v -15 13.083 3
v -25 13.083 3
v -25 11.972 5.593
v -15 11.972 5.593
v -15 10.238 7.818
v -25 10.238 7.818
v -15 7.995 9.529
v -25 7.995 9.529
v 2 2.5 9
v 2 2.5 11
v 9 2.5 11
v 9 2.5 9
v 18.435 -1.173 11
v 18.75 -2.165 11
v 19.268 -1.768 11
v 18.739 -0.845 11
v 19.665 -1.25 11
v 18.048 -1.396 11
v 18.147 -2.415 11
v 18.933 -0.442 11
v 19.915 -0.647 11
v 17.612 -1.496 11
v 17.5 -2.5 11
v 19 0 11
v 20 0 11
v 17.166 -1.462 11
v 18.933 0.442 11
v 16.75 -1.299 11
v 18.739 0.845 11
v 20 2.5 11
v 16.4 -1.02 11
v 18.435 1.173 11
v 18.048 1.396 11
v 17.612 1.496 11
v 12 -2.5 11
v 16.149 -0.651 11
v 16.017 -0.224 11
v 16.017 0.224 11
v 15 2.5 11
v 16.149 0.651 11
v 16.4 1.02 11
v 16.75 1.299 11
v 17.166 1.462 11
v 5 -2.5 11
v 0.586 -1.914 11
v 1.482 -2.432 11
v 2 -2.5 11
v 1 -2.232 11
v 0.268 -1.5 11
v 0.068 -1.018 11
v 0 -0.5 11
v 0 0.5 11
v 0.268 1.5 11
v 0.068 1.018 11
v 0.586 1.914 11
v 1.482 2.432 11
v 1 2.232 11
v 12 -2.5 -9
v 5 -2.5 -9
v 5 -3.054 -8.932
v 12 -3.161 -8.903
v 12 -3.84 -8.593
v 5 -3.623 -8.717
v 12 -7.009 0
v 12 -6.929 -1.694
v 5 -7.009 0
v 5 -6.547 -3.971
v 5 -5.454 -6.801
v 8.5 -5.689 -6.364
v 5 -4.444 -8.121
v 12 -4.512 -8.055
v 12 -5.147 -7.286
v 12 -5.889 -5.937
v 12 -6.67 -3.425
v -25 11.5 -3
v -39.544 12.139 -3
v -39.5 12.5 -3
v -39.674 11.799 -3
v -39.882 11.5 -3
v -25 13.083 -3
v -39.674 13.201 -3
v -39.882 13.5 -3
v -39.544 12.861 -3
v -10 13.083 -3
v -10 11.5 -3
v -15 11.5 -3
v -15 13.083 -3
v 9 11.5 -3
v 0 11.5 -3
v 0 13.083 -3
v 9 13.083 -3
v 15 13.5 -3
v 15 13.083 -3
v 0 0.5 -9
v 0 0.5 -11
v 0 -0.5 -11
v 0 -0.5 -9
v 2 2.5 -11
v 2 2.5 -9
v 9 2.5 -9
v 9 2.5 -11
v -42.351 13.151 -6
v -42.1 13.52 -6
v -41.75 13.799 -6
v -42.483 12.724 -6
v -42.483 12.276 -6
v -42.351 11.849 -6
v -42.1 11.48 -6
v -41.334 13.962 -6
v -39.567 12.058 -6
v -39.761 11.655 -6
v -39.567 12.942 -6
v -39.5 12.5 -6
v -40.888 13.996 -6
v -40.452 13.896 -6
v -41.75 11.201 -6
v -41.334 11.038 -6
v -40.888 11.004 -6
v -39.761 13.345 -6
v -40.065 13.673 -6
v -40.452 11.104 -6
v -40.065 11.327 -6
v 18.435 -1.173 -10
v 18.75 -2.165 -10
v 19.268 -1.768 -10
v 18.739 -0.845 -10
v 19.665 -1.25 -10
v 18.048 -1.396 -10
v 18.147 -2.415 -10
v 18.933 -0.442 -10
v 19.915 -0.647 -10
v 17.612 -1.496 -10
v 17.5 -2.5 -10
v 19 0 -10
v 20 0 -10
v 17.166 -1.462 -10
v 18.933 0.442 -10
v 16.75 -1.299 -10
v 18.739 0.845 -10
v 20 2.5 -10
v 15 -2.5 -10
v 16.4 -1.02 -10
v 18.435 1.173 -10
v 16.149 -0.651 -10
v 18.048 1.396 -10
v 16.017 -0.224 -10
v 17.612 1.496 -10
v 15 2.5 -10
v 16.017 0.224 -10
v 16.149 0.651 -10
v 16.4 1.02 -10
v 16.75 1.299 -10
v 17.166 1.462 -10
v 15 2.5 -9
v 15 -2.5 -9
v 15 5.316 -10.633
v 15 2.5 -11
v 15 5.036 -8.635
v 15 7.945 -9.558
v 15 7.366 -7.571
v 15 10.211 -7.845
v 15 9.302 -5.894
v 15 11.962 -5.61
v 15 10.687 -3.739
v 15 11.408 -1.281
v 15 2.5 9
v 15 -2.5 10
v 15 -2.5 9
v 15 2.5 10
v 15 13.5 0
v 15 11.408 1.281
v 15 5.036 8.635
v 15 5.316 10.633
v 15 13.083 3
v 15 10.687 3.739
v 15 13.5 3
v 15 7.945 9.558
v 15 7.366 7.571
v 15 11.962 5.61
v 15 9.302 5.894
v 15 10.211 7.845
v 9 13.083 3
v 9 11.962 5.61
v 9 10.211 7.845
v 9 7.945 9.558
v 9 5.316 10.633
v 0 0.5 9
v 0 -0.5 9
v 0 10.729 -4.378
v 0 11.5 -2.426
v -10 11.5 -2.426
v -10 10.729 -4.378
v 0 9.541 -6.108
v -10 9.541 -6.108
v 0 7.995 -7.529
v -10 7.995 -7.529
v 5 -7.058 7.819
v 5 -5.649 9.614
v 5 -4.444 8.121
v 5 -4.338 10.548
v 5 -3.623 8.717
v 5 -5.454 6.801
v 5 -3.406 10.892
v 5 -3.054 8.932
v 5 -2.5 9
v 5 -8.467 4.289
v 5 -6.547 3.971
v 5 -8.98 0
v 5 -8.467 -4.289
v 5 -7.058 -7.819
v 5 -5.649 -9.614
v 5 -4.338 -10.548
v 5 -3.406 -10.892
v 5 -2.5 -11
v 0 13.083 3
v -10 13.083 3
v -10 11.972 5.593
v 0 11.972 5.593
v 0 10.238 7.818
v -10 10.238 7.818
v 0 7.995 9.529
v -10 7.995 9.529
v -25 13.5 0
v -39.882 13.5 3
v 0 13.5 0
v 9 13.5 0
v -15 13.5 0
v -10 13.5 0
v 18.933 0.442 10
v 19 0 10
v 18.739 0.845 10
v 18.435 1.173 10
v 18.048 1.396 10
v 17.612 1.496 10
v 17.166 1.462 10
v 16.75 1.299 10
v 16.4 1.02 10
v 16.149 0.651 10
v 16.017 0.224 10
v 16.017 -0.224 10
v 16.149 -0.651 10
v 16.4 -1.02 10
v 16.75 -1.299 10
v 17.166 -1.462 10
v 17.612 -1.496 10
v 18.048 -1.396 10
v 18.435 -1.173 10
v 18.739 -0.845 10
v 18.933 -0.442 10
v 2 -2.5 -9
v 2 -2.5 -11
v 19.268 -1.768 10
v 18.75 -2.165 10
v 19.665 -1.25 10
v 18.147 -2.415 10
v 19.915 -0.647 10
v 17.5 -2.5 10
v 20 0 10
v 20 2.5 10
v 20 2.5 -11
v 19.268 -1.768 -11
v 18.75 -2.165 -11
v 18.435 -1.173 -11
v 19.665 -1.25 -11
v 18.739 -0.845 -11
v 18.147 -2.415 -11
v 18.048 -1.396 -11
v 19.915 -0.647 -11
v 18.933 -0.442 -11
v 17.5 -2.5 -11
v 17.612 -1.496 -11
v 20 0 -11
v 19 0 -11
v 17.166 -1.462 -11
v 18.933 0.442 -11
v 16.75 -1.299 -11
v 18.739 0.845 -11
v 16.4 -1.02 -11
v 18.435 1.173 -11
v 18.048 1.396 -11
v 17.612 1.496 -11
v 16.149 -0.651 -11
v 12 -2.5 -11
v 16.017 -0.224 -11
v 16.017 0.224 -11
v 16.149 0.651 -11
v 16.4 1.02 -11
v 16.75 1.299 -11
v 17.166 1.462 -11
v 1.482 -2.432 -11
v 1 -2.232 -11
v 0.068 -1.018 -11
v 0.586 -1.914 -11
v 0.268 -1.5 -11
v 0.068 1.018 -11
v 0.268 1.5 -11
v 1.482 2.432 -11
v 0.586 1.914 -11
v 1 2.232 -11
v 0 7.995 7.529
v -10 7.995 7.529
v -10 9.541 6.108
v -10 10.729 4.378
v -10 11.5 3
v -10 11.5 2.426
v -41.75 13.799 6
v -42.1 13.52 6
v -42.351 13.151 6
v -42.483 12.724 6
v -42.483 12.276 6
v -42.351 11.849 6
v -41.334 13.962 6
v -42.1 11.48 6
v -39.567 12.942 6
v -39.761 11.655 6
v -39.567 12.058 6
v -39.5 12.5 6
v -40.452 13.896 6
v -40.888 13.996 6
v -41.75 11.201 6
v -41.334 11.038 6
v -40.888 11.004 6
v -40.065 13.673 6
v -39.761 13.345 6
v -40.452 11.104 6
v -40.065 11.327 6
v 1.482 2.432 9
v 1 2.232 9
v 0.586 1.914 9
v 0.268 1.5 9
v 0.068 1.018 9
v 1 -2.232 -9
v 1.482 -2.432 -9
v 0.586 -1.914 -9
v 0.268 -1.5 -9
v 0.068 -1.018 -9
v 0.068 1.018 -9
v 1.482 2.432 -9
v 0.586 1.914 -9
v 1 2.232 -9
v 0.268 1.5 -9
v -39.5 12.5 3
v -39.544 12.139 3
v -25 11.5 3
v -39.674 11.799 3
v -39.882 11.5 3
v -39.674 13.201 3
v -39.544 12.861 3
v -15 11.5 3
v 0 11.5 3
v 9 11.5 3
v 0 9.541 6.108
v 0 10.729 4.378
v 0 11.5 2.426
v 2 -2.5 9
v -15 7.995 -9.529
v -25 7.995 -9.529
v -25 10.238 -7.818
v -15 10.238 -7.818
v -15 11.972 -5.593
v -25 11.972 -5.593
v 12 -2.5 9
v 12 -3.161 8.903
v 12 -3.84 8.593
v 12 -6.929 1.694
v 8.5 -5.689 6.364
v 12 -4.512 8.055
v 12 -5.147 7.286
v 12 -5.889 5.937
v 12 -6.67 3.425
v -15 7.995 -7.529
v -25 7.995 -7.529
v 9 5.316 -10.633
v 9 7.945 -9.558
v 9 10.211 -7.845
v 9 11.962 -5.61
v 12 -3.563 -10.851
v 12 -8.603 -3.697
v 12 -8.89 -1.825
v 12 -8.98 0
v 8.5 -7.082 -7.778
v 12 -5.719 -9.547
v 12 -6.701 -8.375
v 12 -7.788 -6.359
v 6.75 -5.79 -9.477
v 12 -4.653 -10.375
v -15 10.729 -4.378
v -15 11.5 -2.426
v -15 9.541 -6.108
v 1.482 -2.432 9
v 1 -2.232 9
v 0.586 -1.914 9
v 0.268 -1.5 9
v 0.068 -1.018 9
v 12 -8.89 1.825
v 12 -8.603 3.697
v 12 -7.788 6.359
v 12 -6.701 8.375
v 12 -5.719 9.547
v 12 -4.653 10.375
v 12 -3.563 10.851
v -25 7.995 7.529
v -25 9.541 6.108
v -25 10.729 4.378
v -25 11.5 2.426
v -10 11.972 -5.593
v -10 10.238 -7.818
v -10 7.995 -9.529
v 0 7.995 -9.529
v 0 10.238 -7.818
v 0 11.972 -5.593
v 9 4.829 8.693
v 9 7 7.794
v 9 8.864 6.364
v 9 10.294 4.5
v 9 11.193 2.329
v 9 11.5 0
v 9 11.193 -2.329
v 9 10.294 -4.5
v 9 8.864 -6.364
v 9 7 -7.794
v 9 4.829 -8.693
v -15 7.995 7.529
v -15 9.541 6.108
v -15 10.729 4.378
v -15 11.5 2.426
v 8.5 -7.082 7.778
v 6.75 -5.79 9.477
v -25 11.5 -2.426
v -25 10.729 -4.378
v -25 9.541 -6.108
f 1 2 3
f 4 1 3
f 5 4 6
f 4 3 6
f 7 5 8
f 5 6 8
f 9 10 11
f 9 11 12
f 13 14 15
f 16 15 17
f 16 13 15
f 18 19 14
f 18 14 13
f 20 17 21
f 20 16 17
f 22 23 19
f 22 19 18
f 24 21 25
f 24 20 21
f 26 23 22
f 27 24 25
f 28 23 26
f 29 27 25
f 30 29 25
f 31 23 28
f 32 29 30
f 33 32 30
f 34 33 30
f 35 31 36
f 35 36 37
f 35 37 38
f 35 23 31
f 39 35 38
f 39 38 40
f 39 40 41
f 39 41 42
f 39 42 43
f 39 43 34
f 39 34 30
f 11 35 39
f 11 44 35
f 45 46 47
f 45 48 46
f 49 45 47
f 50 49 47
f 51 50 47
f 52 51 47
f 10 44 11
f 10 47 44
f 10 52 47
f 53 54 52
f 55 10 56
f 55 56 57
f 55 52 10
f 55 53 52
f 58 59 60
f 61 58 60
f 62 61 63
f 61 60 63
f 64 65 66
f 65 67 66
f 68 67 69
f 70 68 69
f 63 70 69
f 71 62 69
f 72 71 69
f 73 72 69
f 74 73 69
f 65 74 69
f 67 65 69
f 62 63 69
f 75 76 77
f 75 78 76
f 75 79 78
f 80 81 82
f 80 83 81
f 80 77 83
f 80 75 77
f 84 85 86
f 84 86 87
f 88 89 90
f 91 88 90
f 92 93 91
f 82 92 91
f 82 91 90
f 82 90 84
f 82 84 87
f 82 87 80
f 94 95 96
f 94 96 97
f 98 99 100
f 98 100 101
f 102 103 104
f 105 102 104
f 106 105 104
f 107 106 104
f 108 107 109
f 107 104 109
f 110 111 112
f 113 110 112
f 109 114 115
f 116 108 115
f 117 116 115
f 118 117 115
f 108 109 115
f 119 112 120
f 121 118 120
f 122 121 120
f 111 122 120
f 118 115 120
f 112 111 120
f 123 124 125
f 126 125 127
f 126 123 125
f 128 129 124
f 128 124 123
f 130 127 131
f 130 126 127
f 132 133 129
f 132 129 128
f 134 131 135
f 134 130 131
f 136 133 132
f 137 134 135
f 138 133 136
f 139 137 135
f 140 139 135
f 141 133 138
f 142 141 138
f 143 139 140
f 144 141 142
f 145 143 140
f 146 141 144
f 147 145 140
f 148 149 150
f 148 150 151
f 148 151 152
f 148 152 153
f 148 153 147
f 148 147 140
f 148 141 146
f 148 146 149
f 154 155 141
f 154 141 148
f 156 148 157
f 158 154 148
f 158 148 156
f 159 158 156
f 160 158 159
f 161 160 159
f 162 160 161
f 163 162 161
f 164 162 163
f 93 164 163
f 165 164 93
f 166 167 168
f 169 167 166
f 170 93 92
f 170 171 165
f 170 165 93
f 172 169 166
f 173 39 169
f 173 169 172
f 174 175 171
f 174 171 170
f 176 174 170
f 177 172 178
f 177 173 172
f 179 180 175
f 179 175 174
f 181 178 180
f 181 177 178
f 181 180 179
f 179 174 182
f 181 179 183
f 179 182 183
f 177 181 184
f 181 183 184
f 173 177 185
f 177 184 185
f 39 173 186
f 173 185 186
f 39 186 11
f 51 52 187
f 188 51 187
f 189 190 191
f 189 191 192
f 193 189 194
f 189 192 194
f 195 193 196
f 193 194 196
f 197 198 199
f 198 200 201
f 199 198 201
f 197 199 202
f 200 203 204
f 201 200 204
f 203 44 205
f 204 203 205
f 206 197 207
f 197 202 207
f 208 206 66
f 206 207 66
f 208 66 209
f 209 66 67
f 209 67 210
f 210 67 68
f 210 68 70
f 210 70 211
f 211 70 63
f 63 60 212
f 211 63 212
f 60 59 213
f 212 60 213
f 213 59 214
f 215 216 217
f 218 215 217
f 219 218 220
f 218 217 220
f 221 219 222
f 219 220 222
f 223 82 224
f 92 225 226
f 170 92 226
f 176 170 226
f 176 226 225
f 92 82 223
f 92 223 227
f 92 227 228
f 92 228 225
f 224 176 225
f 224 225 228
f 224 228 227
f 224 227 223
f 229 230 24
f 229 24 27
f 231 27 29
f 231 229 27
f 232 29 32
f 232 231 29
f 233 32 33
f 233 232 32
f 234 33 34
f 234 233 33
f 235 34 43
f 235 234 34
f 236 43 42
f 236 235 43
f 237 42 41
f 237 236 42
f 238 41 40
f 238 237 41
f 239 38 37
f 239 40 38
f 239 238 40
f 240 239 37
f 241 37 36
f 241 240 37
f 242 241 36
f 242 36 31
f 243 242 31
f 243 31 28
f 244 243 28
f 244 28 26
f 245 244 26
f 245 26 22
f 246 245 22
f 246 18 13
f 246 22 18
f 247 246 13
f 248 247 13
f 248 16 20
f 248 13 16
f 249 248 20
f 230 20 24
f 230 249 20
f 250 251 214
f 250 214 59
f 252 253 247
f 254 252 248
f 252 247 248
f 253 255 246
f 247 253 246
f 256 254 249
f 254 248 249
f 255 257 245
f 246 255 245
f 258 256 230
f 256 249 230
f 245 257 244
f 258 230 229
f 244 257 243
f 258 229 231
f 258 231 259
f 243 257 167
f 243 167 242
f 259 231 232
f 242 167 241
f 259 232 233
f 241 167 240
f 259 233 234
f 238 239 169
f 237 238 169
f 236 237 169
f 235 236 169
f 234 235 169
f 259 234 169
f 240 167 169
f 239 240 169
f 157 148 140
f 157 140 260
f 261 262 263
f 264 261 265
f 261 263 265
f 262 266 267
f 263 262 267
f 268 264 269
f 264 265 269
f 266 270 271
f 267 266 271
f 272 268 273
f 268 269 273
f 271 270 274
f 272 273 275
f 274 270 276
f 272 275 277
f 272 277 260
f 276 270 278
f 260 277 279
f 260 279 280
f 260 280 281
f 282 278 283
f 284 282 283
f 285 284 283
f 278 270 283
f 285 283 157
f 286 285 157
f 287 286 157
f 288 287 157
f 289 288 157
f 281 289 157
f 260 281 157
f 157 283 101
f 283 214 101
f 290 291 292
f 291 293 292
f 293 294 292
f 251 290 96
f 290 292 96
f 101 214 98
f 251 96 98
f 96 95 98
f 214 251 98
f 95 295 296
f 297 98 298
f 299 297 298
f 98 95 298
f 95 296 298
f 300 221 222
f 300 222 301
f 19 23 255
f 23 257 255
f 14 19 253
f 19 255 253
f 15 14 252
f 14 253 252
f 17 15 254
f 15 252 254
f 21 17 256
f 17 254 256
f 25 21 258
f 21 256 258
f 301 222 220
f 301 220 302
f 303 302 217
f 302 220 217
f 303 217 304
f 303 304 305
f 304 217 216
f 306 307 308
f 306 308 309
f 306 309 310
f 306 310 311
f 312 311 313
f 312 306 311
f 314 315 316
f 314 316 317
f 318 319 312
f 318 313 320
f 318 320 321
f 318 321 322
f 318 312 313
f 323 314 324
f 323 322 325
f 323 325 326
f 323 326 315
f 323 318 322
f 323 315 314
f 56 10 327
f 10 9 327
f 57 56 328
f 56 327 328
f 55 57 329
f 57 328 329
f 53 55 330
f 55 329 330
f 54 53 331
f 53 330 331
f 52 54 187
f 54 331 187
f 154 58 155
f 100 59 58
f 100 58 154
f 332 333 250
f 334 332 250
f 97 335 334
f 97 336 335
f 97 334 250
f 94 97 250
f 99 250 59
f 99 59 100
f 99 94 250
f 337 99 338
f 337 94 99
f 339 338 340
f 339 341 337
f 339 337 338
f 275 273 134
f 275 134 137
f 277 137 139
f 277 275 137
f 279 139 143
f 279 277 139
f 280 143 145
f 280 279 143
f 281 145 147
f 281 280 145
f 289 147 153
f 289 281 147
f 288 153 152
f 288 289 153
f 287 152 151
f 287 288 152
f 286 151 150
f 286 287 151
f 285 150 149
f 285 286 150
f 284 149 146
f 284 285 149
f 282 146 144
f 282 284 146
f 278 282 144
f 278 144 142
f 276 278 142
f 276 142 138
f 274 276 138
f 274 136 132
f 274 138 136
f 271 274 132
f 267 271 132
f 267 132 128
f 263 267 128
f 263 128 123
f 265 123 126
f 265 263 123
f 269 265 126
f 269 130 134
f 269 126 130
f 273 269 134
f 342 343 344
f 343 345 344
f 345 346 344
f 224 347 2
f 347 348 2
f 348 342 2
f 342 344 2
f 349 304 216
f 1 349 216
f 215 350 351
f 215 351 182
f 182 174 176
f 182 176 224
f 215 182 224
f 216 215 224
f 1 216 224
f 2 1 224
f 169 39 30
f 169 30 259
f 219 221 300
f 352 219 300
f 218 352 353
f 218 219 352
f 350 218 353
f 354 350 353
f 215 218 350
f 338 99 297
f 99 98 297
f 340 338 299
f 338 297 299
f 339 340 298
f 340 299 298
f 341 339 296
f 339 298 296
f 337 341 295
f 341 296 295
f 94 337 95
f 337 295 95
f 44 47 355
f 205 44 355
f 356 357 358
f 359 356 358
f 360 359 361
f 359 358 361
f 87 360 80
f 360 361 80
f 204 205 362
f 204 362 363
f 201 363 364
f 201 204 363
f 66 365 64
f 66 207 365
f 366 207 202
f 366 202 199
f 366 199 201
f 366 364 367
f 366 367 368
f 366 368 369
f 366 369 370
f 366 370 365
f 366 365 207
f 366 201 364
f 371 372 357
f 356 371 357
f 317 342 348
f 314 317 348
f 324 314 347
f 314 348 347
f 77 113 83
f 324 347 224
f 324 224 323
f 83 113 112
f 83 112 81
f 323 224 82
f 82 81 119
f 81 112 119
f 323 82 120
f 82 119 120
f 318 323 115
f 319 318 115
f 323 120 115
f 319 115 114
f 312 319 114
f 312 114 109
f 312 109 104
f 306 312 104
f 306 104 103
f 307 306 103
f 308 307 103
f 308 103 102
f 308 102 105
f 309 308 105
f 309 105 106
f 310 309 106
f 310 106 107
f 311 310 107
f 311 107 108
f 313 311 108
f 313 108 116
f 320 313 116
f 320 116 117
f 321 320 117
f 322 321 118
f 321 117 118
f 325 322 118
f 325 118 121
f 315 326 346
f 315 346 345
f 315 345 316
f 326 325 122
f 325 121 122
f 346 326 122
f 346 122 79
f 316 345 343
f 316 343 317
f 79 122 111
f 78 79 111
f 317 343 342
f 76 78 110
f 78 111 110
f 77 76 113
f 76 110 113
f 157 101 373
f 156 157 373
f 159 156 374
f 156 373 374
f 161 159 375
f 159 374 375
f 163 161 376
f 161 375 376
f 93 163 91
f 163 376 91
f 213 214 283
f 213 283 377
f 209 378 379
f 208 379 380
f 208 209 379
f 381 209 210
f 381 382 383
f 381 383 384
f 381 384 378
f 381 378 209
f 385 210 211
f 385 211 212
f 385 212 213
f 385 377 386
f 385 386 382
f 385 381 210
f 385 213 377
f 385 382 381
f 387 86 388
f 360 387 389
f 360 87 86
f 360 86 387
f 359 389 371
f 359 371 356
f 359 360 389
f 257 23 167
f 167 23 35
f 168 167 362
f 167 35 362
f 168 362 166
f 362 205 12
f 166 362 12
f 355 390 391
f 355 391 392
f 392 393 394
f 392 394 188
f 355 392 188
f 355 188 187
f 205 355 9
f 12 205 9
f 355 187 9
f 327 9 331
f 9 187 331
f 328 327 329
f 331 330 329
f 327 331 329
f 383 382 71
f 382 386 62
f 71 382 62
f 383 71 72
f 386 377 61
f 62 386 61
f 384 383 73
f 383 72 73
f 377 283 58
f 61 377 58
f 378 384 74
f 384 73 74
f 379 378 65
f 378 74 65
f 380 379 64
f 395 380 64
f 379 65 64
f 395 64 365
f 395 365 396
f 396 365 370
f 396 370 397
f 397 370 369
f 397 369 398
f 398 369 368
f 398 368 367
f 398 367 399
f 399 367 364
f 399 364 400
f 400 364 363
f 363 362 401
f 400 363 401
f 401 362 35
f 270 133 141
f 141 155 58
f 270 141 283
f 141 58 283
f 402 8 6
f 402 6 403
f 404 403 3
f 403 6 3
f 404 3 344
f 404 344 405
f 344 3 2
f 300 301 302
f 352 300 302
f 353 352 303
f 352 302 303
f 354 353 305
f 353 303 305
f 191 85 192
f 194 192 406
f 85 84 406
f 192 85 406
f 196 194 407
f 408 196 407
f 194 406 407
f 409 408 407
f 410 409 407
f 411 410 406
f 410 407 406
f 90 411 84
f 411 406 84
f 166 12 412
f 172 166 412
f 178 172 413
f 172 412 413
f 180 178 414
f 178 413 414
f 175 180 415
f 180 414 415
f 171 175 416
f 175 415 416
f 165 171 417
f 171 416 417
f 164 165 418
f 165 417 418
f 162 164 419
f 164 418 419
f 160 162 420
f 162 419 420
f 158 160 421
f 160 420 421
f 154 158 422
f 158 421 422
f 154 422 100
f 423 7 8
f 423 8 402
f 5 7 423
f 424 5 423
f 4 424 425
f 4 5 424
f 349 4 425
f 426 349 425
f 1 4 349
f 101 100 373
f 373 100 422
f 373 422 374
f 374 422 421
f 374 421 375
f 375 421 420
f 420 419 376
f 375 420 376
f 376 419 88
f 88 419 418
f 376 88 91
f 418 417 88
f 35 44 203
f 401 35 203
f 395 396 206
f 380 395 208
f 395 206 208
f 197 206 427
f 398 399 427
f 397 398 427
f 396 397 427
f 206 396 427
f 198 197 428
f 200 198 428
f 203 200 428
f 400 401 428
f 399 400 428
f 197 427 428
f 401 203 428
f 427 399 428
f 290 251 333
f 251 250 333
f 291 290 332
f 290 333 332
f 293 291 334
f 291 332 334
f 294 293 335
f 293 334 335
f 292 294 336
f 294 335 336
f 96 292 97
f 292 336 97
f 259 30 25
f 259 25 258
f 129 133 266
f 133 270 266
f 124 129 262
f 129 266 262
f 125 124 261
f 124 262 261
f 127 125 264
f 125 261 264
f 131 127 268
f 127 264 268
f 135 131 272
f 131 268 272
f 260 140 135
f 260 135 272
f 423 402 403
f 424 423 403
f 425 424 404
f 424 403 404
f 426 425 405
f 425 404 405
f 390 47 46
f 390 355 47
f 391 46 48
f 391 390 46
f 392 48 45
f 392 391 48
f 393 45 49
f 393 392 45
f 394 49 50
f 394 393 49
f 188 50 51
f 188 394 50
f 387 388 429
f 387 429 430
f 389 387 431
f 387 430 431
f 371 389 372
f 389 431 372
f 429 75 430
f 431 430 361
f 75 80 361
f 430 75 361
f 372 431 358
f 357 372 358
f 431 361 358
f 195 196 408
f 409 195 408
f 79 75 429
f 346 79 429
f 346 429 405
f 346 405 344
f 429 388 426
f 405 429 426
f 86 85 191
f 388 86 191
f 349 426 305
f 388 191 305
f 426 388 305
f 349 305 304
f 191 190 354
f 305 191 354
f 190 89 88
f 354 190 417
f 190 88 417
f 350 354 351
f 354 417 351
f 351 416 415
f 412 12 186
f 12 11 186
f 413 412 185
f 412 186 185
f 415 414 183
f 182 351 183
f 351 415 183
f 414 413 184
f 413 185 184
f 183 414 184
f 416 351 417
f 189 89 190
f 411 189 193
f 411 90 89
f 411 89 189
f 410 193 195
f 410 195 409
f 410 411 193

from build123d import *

# Parameters (mm, degrees)
SKETCH1_W                = 2
SKETCH1_H                = 5
BOSS_EXTRUDE1_DEPTH      = 15
BOSS_EXTRUDE1_2_DEPTH    = 15
SKETCH2_W                = 1
SKETCH2_H                = 5
BOSS_EXTRUDE2_DEPTH      = 5
CUT_EXTRUDE1_DEPTH       = 30.107559156
CUT_EXTRUDE1_DEPTH_BACK  = 30.107559156
SKETCH3_R                = 1.5
SWEEP1_START             = 9
SWEEP1_DEPTH             = 6
BOSS_EXTRUDE3_DEPTH      = 12
CUT_EXTRUDE2_DEPTH       = 5
FILLET1_R                = 2
BOSS_EXTRUDE6_START      = -6
SKETCH7_W                = 6
SKETCH7_H                = 2
BOSS_EXTRUDE6_DEPTH      = 56
BOSS_EXTRUDE7_DEPTH      = 3
BOSS_EXTRUDE7_DEPTH_BACK = 9
SKETCH8_R                = 1.5
FILLET2_R                = 2.5
BOSS_EXTRUDE10_DEPTH     = 10
LPATTERN1_COUNT          = 2
LPATTERN1_PITCH          = 15


# Read off the part's stored shape, not the designer's step: Sweep1
with BuildPart() as part:
    # Sketch1 → Boss-Extrude1 (new body)
    with BuildSketch(Plane(origin=(0, 0, 0), x_dir=(0, 0, -1), z_dir=(1, 0, 0))):
        with Locations((-10, 0)):
            Rectangle(SKETCH1_W, SKETCH1_H)
    extrude(amount=BOSS_EXTRUDE1_DEPTH)



with BuildPart() as body_2:
    # Sketch1 → Boss-Extrude1 2 (new body)
    with BuildSketch(Plane(origin=(0, 0, 0), x_dir=(0, 0, -1), z_dir=(1, 0, 0))):
        with Locations((10, 0)):
            Rectangle(SKETCH1_W, SKETCH1_H)
    extrude(amount=BOSS_EXTRUDE1_2_DEPTH)


with BuildPart() as part_1:
    add(part.part)

    add(body_2.part)  # Boss-Extrude2 merges body 2
    # Sketch2 → Boss-Extrude2 (add)
    with BuildSketch(Plane(origin=(15, 0, 0), x_dir=(0, 0, -1), z_dir=(1, 0, 0))):
        with Locations((10.5, 0)):
            Rectangle(SKETCH2_W, SKETCH2_H)
        with Locations((-10.5, 0)):
            Rectangle(SKETCH2_W, SKETCH2_H)
    extrude(amount=BOSS_EXTRUDE2_DEPTH)

    # Sketch3 → Cut-Extrude1 (cut, two sides: drawn at the far end of the back side and taken through both)
    with BuildSketch(Plane.XY.offset(-10).offset(-CUT_EXTRUDE1_DEPTH_BACK)):
        with Locations((17.5, 0)):
            Circle(SKETCH3_R)
    extrude(amount=CUT_EXTRUDE1_DEPTH + CUT_EXTRUDE1_DEPTH_BACK, mode=Mode.SUBTRACT)

    # Sweep1 outline → Sweep1 (add)
    with BuildSketch(Plane.YZ.offset(SWEEP1_START)):
        with BuildLine():
            ThreePointArc((2.5, -11), (13.5, 0), (2.5, 11))
            Line((2.5, 11), (2.5, 9))
            ThreePointArc((2.5, 9), (11.5, 0), (2.5, -9))
            Line((2.5, -9), (2.5, -11))
        make_face()
    extrude(amount=SWEEP1_DEPTH)

    # Sketch5 → Boss-Extrude3 (add)
    with BuildSketch(Plane(origin=(0, 0, 0), x_dir=(0, 0, -1), z_dir=(1, 0, 0))):
        with BuildLine():
            Line((-9, -2.5), (-11, -2.5))
            add(Edge.make_bspline(
                [(-11, -2.5), (-11, -8.980170496), (0, -8.980170496)],
                knots=[3.141592654, 3.141592654, 3.141592654, 4.71238898, 4.71238898, 4.71238898], degree=2, weights=[1, 0.707106781, 1]))
            Line((0, -8.980170496), (0, -7.009343108))
            add(Edge.make_bspline(
                [(-9, -2.5), (-9, -7.009343108), (0, -7.009343108)],
                knots=[3.141592654, 3.141592654, 3.141592654, 4.71238898, 4.71238898, 4.71238898], degree=2, weights=[1, 0.707106781, 1]))
        make_face()
    boss_extrude3 = extrude(amount=BOSS_EXTRUDE3_DEPTH)

    # Sketch6 → Cut-Extrude2 (cut)
    with BuildSketch(Plane.ZY):
        with BuildLine():
            Line((11, -2.5), (9, -2.5))
            add(Edge.make_bspline(
                [(0, -7.009343108), (9, -7.009343108), (9, -2.5)],
                knots=[4.71238898, 4.71238898, 4.71238898, 6.283185307, 6.283185307, 6.283185307], degree=2, weights=[1, 0.707106781, 1]))
            Line((0, -7.009343108), (0, -8.980170496))
            add(Edge.make_bspline(
                [(0, -8.980170496), (11, -8.980170496), (11, -2.5)],
                knots=[4.71238898, 4.71238898, 4.71238898, 6.283185307, 6.283185307, 6.283185307], degree=2, weights=[1, 0.707106781, 1]))
        make_face()
    cut_extrude2 = extrude(amount=-CUT_EXTRUDE2_DEPTH, mode=Mode.SUBTRACT)

    # Mirror2: Boss-Extrude3, Cut-Extrude2 across plane
    add(boss_extrude3.mirror(Plane(origin=(12, -8.980170496, 0), x_dir=(1, 0, 0), z_dir=(0, 0, 1))))
    add(cut_extrude2.mirror(Plane(origin=(12, -8.980170496, 0), x_dir=(1, 0, 0), z_dir=(0, 0, 1))), mode=Mode.SUBTRACT)

    # Fillet1
    fillet1_edges = [part_1.edges().sort_by_distance(p)[0] for p in [
        (0, -2.5, -10),
        (0, 2.5, -10),
        (0, 2.5, 10),
        (0, -2.5, 10),
    ]]
    fillet(fillet1_edges, radius=FILLET1_R)

    # Sketch7 → Boss-Extrude6 (add)
    with BuildSketch(Plane.ZY.offset(-9).offset(BOSS_EXTRUDE6_START)):
        with Locations((0, 12.5)):
            Rectangle(SKETCH7_W, SKETCH7_H)
    extrude(amount=BOSS_EXTRUDE6_DEPTH)

    # Sketch8 → Boss-Extrude7 (add, two sides: drawn at the far end of the back side and taken through both)
    with BuildSketch(Plane.XY.offset(3).offset(-BOSS_EXTRUDE7_DEPTH_BACK)):
        with Locations((-41, 12.5)):
            Circle(SKETCH8_R)
    extrude(amount=BOSS_EXTRUDE7_DEPTH + BOSS_EXTRUDE7_DEPTH_BACK)

    # Fillet2
    fillet2_edges = [part_1.edges().sort_by_distance(p)[0] for p in [
        (20, -2.5, -10.5),
        (20, -2.5, 10.5),
    ]]
    fillet(fillet2_edges, radius=FILLET2_R)

    # 3DSketch3 → Boss-Extrude10 (add)
    with BuildSketch(Plane(origin=(-10, 7.995255445, 9.529017137), x_dir=(0, 0, -1), z_dir=(1, 0, 0))):
        with BuildLine():
            Line((0, 0), (2, 0))
            ThreePointArc((2, 0), (9.529017137, 3.825899604), (17.058034273, 0))
            Line((17.058034273, 0), (19.058034273, 0))
            ThreePointArc((19.058034273, 0), (15.031388903, 4.029654263), (9.529017137, 5.504744555))
            ThreePointArc((9.529017137, 5.504744555), (4.026645371, 4.029654263), (0, 0))
        make_face()
    boss_extrude10 = extrude(amount=BOSS_EXTRUDE10_DEPTH)

    # LPattern1: Boss-Extrude10 ×2
    with Locations(*[(-i * LPATTERN1_PITCH, 0, 0) for i in range(1, LPATTERN1_COUNT)]):
        add(boss_extrude10)


solid = part_1.part
